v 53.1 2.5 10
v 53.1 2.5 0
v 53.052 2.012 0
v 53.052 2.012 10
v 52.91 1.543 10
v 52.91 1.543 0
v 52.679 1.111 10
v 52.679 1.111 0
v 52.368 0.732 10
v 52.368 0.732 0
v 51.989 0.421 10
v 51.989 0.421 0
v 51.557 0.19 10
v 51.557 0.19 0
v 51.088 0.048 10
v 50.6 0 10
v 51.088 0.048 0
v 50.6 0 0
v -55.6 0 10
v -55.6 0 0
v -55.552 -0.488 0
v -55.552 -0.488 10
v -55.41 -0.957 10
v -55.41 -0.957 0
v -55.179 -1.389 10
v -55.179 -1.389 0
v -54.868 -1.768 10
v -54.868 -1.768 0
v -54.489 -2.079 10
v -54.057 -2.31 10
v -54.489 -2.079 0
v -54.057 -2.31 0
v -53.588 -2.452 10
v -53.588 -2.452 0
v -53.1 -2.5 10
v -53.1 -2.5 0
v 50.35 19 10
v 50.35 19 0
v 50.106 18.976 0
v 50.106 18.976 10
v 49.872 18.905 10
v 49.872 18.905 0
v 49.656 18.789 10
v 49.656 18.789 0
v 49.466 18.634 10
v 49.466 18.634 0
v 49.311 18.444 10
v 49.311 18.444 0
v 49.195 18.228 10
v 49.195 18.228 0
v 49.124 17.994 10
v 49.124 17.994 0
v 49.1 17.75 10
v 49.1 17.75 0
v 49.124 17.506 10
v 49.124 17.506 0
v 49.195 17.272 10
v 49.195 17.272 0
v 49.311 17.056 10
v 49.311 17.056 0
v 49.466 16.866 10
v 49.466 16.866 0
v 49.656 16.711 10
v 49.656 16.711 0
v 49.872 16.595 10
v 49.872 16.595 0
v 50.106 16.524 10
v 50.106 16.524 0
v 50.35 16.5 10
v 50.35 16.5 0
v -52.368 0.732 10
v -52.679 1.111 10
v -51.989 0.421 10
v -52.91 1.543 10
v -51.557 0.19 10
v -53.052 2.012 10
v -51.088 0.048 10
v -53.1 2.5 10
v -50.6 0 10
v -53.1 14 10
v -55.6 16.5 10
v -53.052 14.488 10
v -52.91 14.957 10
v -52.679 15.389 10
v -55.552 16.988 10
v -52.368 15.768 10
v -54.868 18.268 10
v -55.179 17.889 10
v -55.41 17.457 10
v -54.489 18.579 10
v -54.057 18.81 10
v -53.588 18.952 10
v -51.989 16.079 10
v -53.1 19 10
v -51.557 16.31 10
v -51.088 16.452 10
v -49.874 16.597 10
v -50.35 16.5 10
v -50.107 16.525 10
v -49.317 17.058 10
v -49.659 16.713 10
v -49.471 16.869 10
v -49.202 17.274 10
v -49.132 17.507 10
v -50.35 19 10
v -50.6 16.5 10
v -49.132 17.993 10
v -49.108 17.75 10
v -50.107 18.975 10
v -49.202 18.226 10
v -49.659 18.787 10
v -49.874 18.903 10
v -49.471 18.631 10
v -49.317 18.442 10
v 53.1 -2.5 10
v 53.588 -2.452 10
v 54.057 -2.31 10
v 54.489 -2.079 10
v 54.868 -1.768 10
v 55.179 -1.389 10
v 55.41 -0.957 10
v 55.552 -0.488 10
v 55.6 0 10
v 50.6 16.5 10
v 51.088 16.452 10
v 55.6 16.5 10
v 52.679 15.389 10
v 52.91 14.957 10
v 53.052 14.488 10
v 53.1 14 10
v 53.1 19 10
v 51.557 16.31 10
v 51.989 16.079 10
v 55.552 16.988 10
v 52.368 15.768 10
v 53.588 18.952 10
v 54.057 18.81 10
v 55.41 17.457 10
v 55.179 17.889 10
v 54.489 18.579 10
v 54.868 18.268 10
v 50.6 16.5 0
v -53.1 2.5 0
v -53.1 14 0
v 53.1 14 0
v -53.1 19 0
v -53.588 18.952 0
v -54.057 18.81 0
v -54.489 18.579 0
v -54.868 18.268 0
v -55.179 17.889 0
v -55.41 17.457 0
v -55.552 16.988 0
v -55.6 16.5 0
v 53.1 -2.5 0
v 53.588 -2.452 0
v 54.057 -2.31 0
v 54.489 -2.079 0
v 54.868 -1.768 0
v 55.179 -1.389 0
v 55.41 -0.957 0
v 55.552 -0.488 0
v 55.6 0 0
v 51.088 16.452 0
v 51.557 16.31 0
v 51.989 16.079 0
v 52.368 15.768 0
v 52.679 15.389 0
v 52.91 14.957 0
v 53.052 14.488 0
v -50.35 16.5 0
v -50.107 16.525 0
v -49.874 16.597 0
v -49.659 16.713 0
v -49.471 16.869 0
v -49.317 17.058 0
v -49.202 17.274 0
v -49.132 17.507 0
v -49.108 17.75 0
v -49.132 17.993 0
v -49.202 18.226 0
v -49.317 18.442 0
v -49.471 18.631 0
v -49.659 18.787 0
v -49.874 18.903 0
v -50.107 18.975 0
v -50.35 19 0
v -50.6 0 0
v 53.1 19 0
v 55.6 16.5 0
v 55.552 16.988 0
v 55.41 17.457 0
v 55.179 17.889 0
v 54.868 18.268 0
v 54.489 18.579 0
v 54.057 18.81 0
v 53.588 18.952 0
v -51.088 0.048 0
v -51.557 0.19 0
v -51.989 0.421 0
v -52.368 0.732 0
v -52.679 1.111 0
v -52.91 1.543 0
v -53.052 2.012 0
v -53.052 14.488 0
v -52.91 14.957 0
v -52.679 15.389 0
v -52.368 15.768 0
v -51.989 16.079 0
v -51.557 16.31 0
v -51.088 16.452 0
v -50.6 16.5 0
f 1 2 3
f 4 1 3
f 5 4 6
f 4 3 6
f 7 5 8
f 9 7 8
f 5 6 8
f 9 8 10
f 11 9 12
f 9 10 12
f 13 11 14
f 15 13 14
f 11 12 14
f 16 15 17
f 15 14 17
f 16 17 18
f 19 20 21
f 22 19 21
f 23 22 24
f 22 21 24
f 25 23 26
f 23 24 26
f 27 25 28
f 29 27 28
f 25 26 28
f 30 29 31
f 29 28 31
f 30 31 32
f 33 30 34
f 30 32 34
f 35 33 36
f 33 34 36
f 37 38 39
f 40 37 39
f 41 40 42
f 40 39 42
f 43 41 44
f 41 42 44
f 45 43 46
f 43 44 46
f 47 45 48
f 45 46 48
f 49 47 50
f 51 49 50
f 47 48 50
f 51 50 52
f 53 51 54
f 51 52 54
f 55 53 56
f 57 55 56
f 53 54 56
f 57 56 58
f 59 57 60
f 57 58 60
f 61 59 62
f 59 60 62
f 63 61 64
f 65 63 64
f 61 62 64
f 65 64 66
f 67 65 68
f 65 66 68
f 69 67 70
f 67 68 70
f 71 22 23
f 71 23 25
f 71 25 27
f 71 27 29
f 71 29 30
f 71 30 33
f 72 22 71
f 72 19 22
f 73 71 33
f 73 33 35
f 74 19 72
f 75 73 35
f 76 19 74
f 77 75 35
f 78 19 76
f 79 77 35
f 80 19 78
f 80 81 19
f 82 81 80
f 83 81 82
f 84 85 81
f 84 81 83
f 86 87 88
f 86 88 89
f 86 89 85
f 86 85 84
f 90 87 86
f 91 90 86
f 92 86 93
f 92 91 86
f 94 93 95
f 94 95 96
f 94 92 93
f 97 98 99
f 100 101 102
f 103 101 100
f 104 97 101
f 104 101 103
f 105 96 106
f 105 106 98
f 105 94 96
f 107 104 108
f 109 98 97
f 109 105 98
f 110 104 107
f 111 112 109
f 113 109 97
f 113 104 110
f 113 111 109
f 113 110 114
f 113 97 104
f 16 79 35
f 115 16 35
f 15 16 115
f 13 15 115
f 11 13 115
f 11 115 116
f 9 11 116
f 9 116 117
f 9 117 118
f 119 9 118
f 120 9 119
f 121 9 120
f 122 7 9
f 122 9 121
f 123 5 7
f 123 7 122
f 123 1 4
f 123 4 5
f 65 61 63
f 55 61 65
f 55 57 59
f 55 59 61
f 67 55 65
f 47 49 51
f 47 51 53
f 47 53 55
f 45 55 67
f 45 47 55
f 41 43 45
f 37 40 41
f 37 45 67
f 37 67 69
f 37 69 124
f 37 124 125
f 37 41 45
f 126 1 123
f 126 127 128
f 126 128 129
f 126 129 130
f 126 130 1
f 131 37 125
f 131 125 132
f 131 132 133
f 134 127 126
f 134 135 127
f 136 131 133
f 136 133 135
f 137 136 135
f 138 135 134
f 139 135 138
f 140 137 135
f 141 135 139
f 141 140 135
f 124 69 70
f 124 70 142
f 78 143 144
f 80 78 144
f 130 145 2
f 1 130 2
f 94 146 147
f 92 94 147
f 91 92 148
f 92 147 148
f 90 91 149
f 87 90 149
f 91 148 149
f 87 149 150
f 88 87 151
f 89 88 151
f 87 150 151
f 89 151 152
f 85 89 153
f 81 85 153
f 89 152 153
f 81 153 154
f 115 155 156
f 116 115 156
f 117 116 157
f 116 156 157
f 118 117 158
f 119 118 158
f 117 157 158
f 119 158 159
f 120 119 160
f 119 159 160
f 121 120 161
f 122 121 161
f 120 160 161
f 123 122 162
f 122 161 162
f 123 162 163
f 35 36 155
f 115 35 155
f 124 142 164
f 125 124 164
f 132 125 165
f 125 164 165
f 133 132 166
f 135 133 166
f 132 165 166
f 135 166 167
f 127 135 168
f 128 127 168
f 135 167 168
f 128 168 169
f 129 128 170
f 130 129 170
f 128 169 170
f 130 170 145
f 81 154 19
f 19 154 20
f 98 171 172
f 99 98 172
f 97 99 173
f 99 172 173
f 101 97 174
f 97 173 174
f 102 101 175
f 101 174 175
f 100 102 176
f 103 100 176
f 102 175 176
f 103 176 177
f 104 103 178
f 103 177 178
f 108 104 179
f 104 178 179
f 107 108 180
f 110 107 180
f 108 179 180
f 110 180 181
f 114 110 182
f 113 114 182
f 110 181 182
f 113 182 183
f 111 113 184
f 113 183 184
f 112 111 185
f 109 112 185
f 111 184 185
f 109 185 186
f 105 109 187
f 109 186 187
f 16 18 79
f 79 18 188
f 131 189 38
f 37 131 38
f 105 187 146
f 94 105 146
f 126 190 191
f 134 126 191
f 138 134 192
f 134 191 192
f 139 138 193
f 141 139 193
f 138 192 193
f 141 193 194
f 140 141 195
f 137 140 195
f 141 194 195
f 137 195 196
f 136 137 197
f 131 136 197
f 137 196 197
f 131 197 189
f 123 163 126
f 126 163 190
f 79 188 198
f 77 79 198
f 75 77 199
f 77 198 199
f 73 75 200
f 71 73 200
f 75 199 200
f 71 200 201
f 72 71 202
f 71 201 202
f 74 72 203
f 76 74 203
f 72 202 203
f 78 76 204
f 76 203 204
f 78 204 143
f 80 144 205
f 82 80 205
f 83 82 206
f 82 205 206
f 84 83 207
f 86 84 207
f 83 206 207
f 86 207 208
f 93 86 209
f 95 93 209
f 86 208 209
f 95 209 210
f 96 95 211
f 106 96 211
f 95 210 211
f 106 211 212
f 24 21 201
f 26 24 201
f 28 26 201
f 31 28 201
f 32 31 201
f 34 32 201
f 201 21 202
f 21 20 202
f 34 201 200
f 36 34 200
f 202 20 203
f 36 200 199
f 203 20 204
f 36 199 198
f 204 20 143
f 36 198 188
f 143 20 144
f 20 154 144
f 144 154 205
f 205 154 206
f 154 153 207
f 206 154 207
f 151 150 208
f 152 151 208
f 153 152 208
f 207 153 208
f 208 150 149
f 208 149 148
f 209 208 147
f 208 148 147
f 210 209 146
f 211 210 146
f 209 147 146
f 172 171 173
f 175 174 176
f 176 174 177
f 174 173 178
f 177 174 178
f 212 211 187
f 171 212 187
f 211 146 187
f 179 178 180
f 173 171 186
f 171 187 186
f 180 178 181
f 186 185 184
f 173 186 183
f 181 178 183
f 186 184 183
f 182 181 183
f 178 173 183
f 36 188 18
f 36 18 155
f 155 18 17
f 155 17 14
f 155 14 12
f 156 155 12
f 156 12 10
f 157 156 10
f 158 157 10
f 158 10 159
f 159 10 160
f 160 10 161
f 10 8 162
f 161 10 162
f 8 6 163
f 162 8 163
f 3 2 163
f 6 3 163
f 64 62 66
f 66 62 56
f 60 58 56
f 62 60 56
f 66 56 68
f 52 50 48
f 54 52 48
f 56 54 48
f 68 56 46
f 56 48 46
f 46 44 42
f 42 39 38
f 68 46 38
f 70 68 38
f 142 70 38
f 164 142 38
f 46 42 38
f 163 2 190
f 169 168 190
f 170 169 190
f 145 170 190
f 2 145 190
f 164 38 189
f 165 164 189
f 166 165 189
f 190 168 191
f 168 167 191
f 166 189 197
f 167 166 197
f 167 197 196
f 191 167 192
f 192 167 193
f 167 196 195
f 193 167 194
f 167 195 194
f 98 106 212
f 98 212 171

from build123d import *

# Parameters (mm, degrees)
F1_DEPTH = 10


with BuildPart() as f1:
    # F0 (on Top) → F1 (new body)
    with BuildSketch(Plane.XY):
        with BuildLine():
            Line((50.6, 0), (0, 0))
            Line((0, 0), (-50.6, 0))
            ThreePointArc((-50.6, 0), (-52.367767, 0.732233), (-53.1, 2.5))
            Line((-53.1, 2.5), (-53.1, 14))
            ThreePointArc((-53.1, 14), (-52.367767, 15.767767), (-50.6, 16.5))
            Line((-50.6, 16.5), (-50.35, 16.5))
            ThreePointArc((-50.35, 16.5), (-49.108107, 17.75), (-50.35, 19))
            Line((-50.35, 19), (-53.1, 19))
            ThreePointArc((-53.1, 19), (-54.867767, 18.267767), (-55.6, 16.5))
            Line((-55.6, 16.5), (-55.6, 0))
            ThreePointArc((-55.6, 0), (-54.867767, -1.767767), (-53.1, -2.5))
            Line((-53.1, -2.5), (0, -2.5))
            Line((0, -2.5), (53.1, -2.5))
            ThreePointArc((53.1, -2.5), (54.867767, -1.767767), (55.6, 0))
            Line((55.6, 0), (55.6, 16.5))
            ThreePointArc((55.6, 16.5), (54.867767, 18.267767), (53.1, 19))
            Line((53.1, 19), (50.35, 19))
            ThreePointArc((50.35, 19), (49.1, 17.75), (50.35, 16.5))
            Line((50.35, 16.5), (50.6, 16.5))
            ThreePointArc((50.6, 16.5), (52.367767, 15.767767), (53.1, 14))
            Line((53.1, 14), (53.1, 2.5))
            ThreePointArc((53.1, 2.5), (52.367767, 0.732233), (50.6, 0))
        make_face()
    extrude(amount=F1_DEPTH)


solid = f1.part
